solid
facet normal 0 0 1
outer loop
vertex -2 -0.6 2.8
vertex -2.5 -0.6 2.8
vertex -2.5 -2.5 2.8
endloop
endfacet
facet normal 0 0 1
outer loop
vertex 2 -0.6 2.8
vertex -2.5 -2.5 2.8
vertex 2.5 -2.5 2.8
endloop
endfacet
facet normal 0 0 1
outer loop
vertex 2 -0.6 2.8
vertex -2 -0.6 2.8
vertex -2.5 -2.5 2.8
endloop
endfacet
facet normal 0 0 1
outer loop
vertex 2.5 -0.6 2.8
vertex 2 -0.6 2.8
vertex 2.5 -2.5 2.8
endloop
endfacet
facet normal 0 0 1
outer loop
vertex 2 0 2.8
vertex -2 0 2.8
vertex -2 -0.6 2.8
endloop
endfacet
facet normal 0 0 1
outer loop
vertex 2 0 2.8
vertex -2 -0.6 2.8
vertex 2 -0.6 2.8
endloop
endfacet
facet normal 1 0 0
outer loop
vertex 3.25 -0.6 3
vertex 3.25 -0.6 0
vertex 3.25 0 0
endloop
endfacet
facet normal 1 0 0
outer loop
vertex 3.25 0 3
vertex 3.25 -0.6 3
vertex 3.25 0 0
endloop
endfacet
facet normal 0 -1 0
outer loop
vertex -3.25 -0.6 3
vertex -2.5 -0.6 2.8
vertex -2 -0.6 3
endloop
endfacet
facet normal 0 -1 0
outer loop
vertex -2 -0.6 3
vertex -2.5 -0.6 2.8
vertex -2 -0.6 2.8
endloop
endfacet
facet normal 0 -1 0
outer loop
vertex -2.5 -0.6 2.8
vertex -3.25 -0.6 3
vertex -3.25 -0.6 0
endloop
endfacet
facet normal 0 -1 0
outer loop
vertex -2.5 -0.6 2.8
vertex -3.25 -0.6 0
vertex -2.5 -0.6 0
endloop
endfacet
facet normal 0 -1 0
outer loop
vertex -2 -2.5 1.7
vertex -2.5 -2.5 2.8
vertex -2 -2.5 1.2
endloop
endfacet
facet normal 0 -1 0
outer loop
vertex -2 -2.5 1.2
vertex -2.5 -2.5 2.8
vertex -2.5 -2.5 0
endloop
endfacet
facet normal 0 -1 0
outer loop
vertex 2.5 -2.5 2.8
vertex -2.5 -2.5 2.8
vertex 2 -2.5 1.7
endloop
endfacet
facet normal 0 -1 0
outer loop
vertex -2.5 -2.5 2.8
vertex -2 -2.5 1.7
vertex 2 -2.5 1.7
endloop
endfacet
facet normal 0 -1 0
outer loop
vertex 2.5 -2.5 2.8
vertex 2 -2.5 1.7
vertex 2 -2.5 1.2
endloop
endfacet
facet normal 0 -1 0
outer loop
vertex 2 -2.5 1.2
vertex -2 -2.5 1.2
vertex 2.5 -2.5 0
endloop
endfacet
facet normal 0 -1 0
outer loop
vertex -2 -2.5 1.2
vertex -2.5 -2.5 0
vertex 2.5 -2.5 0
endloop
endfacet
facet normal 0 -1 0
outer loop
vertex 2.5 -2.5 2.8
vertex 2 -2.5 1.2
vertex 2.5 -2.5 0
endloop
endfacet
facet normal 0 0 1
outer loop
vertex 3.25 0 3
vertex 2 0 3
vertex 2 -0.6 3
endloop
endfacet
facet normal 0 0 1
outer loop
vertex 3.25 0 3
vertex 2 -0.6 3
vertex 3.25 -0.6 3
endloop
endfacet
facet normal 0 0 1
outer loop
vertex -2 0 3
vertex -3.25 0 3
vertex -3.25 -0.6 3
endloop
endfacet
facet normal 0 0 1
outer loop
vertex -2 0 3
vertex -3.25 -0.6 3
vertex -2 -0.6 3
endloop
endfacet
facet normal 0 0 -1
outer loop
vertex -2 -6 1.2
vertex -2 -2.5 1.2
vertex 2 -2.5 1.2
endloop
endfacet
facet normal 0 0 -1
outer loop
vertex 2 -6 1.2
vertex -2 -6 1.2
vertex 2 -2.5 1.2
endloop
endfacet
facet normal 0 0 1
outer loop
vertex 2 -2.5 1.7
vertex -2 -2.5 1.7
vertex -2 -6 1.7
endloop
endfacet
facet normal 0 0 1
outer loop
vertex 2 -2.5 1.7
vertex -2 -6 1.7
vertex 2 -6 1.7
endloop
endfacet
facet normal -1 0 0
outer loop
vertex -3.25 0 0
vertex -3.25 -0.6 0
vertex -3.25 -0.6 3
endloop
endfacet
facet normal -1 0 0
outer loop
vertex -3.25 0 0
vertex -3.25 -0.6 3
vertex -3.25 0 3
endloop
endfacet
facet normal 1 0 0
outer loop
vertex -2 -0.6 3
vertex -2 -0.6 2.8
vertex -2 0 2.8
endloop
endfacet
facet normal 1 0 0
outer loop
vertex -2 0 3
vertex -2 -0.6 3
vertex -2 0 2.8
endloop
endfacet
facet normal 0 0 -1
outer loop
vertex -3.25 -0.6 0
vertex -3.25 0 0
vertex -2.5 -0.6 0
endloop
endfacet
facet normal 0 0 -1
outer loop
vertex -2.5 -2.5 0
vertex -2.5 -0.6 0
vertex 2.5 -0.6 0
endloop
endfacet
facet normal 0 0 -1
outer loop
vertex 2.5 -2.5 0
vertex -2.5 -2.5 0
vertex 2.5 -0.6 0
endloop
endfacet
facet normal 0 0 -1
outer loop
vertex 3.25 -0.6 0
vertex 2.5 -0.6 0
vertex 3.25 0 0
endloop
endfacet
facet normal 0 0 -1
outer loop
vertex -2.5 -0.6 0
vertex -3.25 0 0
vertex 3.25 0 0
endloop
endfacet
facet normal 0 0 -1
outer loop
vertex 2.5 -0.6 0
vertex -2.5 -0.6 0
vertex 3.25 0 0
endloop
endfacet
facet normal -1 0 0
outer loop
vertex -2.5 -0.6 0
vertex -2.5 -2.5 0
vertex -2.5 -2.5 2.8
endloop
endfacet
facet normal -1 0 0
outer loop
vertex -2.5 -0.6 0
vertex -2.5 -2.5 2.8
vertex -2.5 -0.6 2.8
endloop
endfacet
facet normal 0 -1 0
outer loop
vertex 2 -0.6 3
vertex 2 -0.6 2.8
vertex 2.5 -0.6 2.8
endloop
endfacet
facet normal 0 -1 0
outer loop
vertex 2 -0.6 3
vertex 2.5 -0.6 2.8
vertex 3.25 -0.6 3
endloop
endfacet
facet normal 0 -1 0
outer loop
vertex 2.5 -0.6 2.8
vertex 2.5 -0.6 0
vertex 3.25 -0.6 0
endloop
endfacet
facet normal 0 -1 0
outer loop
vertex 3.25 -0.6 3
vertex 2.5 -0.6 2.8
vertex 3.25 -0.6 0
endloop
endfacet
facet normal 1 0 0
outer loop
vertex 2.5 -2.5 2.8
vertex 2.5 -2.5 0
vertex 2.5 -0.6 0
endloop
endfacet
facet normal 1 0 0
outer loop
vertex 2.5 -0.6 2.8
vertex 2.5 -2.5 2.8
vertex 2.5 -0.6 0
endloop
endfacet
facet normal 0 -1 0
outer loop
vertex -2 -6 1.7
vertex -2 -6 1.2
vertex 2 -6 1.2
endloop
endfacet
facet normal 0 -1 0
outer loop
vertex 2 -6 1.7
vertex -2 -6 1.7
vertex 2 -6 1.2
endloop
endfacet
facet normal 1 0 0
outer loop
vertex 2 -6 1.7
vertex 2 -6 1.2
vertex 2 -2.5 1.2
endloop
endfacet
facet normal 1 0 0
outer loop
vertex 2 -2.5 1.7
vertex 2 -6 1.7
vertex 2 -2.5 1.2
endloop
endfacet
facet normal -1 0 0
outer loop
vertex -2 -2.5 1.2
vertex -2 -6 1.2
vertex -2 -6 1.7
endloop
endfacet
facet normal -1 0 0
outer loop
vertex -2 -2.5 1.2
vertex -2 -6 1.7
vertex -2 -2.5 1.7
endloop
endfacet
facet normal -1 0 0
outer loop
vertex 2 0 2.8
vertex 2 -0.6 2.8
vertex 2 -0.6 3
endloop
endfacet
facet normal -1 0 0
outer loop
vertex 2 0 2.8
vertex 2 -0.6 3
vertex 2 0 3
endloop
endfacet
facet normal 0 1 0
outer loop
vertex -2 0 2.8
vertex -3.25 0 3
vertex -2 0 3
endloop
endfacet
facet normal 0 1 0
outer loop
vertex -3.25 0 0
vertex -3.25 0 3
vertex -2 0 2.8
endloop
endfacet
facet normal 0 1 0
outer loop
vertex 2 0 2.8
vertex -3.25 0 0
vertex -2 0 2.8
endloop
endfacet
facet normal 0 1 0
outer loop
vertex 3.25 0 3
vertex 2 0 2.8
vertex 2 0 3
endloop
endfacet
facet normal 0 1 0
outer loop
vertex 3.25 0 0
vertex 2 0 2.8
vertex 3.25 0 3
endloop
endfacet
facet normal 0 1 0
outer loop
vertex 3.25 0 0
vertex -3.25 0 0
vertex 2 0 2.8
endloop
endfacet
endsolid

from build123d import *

# Parameters (mm, degrees)
BOX064_W     = 4
BOX064_H     = 0.6
BOX064_DEPTH = 0.2
BOX063_W     = 6.5
BOX063_H     = 0.6
BOX063_DEPTH = 3
BOX066_W     = 4
BOX066_H     = 3.5
BOX066_DEPTH = 0.5
BOX065_W     = 5
BOX065_H     = 2.5
BOX065_DEPTH = 2.8


with BuildPart() as cube037:
    # Box064 → Box064 (new body)
    with BuildSketch(Plane(origin=(-2, -0.6, 2.8), x_dir=(1, 0, 0), z_dir=(0, 0, 1))):
        with Locations((2, 0.3)):
            Rectangle(BOX064_W, BOX064_H)
    extrude(amount=BOX064_DEPTH)


with BuildPart() as cut015:
    # Box063 → Box063 (new body)
    with BuildSketch(Plane(origin=(-3.25, -0.6, 0), x_dir=(1, 0, 0), z_dir=(0, 0, 1))):
        with Locations((3.25, 0.3)):
            Rectangle(BOX063_W, BOX063_H)
    extrude(amount=BOX063_DEPTH)

    # Cut014: cut Cube037
    add(cube037.part, mode=Mode.SUBTRACT)


with BuildPart() as cube039:
    # Box066 → Box066 (new body)
    with BuildSketch(Plane(origin=(-2, -6, 1.2), x_dir=(1, 0, 0), z_dir=(0, 0, 1))):
        with Locations((2, 1.75)):
            Rectangle(BOX066_W, BOX066_H)
    extrude(amount=BOX066_DEPTH)


with BuildPart() as body008:
    # Box065 → Box065 (new body)
    with BuildSketch(Plane(origin=(-2.5, -2.5, 0), x_dir=(1, 0, 0), z_dir=(0, 0, 1))):
        with Locations((2.5, 1.25)):
            Rectangle(BOX065_W, BOX065_H)
    extrude(amount=BOX065_DEPTH)

    # Fusion048: union Cut015, Cube039
    add(cut015.part)
    add(cube039.part)


solid = body008.part
